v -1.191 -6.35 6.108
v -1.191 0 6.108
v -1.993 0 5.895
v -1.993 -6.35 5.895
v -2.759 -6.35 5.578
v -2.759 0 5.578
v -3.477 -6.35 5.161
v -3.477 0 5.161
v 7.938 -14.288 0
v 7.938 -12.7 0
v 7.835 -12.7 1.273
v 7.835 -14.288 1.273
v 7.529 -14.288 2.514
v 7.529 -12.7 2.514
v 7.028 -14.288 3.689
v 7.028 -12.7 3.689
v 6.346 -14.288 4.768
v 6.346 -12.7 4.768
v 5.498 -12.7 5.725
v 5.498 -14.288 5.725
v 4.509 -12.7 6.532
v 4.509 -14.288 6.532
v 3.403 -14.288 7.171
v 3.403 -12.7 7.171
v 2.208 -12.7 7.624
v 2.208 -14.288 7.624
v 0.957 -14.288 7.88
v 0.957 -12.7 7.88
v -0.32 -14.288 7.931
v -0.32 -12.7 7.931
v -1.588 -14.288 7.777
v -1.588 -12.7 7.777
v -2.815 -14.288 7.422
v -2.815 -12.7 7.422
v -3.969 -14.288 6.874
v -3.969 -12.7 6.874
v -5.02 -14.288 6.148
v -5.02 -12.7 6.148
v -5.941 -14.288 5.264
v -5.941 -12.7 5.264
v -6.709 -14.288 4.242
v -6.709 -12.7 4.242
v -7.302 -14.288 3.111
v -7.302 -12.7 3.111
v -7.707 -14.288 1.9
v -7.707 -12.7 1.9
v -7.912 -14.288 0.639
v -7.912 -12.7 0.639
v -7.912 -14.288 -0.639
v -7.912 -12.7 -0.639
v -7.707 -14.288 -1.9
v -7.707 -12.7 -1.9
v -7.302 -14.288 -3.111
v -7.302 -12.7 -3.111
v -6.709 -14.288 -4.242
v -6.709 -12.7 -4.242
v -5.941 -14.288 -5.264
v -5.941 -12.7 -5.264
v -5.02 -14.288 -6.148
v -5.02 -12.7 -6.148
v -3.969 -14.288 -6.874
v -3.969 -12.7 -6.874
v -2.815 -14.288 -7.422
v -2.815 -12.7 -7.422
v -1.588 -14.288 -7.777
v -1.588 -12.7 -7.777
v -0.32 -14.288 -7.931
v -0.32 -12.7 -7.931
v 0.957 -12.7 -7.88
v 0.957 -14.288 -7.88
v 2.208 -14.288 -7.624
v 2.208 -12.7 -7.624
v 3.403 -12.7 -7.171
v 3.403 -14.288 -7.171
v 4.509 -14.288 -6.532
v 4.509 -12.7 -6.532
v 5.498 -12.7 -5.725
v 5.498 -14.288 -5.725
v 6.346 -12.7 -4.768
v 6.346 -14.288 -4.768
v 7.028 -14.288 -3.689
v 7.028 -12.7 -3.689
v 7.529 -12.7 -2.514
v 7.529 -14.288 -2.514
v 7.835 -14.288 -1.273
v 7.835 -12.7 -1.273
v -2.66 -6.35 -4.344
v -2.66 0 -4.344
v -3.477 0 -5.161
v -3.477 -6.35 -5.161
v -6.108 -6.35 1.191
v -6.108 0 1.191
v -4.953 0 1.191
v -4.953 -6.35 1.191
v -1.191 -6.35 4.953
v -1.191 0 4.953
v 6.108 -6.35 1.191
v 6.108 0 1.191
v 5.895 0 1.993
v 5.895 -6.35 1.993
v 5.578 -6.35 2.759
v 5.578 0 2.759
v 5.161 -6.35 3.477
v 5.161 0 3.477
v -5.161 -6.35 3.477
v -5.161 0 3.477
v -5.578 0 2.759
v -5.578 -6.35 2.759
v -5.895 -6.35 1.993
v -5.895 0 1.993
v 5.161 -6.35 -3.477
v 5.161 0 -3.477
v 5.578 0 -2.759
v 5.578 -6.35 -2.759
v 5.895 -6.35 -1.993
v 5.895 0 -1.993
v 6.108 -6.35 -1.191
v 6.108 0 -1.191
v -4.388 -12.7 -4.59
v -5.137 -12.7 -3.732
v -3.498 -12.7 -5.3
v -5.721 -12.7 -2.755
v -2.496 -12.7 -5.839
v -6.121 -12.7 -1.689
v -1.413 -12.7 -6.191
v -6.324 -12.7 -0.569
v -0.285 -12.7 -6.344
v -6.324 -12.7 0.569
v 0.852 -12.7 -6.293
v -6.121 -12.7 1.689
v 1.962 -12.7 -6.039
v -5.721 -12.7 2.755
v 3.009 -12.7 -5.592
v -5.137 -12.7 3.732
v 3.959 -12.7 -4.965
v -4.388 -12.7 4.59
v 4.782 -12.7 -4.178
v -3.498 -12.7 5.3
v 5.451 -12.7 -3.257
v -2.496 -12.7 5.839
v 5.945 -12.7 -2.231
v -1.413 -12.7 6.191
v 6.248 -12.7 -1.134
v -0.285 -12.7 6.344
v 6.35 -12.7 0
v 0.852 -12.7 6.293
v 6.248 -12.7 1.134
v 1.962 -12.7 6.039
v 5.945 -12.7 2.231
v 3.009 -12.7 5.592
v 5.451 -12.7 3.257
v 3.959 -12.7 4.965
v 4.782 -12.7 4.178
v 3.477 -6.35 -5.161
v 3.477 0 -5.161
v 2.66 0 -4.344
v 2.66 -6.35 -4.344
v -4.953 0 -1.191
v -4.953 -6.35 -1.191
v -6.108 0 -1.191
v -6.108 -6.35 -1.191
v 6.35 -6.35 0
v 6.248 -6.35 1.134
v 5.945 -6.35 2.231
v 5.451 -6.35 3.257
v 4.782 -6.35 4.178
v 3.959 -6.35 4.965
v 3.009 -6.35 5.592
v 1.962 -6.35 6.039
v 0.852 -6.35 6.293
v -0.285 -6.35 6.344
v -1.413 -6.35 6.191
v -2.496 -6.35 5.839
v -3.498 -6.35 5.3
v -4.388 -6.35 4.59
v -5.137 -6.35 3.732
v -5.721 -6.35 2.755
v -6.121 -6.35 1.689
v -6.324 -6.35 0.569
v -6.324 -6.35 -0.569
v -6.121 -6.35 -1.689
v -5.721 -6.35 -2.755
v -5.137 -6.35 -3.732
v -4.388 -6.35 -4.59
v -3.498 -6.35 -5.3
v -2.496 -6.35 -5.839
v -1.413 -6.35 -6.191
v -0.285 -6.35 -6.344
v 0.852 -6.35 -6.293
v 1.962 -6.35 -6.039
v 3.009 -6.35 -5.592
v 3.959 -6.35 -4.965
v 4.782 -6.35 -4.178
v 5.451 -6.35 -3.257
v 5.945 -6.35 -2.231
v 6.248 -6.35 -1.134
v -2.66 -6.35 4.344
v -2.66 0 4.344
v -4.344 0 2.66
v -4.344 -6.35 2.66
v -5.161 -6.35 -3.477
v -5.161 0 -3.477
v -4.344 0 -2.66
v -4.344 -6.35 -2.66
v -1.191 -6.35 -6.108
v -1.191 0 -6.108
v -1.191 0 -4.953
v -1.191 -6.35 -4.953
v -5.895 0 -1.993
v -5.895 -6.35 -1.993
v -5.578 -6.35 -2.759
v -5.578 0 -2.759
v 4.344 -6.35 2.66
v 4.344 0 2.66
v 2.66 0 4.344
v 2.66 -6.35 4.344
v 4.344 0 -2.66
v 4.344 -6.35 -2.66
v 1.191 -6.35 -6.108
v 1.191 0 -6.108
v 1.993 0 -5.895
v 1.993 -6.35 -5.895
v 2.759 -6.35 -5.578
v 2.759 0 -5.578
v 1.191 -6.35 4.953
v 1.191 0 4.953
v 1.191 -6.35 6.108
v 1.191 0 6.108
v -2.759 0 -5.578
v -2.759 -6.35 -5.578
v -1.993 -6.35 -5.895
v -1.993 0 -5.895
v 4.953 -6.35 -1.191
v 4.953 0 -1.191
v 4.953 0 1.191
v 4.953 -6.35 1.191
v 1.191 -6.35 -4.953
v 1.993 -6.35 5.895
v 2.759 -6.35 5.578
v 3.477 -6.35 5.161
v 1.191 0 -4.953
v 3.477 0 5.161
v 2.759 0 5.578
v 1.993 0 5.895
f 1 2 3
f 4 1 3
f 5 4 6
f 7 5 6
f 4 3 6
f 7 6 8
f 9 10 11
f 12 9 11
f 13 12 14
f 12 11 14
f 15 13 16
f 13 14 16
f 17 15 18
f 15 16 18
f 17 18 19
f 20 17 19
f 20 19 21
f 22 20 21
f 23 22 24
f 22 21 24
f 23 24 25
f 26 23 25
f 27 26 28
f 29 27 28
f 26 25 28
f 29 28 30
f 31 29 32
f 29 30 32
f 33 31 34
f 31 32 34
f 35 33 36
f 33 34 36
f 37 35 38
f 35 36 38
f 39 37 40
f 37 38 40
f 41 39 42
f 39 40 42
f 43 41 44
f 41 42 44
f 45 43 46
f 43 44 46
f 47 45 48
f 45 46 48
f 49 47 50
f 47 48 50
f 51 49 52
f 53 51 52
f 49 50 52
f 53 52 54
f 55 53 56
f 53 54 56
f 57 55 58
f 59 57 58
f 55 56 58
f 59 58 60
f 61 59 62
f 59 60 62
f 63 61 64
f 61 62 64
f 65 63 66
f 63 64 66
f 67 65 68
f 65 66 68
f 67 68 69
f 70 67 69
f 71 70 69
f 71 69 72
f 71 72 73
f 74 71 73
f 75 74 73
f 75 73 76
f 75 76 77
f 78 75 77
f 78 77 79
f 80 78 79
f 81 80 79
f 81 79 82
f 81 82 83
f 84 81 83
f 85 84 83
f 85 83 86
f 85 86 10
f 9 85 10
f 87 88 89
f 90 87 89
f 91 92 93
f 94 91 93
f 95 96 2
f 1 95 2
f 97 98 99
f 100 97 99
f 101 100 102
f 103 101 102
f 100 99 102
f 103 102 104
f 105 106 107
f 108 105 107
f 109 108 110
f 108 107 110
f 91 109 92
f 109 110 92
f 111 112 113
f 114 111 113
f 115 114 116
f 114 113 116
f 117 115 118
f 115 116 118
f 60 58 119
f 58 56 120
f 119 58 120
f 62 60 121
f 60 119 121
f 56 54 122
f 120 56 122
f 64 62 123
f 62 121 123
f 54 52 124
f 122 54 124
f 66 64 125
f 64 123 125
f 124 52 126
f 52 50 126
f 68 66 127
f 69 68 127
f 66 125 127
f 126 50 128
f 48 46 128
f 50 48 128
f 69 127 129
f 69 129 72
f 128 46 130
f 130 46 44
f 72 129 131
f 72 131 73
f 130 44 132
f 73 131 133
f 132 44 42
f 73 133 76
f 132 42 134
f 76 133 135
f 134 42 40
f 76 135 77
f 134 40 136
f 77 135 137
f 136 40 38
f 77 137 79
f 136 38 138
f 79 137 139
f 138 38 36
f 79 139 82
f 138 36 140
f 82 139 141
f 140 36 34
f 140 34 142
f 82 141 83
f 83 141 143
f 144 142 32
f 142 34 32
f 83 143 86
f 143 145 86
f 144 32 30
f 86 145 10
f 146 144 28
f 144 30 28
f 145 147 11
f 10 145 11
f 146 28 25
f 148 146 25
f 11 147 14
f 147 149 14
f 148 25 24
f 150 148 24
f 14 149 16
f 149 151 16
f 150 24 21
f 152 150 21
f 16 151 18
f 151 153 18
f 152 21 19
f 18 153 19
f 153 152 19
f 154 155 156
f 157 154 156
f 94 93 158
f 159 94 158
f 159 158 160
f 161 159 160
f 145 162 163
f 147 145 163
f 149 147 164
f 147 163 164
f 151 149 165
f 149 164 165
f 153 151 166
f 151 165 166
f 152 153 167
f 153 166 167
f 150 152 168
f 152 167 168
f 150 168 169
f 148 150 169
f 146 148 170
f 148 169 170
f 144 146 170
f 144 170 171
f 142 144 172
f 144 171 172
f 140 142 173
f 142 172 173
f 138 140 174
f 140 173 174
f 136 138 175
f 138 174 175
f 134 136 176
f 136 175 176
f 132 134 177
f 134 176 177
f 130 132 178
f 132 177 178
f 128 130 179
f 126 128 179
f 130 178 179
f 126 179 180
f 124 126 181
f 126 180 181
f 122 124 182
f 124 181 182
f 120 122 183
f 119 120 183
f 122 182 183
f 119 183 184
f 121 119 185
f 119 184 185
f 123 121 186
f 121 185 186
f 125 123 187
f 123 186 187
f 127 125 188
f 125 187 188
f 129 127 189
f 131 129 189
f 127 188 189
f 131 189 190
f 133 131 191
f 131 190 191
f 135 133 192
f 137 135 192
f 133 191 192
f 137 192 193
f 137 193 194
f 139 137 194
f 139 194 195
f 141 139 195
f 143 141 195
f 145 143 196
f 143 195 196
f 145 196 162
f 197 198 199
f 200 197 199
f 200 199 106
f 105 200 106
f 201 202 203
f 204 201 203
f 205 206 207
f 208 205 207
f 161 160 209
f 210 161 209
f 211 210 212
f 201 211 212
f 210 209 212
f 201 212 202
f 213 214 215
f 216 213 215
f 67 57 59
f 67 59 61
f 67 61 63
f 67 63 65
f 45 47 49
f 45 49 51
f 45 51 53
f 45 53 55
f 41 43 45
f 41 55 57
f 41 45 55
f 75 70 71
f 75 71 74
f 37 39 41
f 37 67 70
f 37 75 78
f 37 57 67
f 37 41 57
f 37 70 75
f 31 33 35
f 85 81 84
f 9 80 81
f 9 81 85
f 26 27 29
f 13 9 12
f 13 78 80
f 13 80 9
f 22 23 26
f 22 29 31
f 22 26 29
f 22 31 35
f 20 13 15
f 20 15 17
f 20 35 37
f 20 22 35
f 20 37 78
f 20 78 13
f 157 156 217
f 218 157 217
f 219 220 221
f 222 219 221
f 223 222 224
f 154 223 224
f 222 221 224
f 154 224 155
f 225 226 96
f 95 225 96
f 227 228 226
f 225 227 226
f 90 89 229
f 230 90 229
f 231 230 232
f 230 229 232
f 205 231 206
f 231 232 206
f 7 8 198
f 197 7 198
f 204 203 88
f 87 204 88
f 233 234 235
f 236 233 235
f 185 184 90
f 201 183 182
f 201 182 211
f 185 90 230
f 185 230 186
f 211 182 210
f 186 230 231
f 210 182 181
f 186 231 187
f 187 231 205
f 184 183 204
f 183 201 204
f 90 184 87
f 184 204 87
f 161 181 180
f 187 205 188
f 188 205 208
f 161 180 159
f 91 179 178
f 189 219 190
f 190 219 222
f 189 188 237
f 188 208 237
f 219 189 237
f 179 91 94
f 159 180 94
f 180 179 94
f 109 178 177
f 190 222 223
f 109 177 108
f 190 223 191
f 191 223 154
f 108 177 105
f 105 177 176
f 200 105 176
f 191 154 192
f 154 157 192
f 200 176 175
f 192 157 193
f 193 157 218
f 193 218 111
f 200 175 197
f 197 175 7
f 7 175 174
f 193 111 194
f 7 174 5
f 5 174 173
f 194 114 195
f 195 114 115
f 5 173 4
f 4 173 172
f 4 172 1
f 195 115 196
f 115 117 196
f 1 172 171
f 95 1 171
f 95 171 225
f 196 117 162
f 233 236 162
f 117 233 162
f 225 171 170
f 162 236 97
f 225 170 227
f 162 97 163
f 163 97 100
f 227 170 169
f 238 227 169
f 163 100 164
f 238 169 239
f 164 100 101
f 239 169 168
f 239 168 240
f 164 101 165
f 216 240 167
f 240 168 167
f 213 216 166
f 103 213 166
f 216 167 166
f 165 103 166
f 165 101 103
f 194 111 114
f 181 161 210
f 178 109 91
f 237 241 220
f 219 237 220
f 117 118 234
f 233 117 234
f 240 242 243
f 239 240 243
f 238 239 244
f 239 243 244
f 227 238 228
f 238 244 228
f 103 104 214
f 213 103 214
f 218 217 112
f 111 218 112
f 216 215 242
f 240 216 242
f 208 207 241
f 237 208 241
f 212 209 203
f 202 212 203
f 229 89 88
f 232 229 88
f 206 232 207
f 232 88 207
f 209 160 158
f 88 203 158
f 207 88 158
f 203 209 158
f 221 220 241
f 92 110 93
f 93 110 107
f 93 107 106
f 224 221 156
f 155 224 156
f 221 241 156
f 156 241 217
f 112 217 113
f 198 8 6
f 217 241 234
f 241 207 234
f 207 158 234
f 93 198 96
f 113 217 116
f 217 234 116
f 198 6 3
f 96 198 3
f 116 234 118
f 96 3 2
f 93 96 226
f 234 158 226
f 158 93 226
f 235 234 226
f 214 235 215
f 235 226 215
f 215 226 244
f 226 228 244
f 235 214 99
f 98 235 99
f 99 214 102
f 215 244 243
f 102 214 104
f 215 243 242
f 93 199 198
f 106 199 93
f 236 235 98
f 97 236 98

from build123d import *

# Parameters (mm, degrees)
F1_DEPTH = 6.35
F2_R     = 6.35
F3_DEPTH = 6.35
F4_R     = 7.9375
F4_R_2   = 6.35
F5_DEPTH = 1.5875


with BuildPart() as f1:
    # F0 (on Front) → F1 (new body)
    with BuildSketch(Plane.XZ):
        with BuildLine():
            Line((-1.190625, 4.953), (-1.190625, 6.108039))
            ThreePointArc((-1.190625, 6.108039), (-2.381439, 5.749302), (-3.477137, 5.160935))
            Line((-3.477137, 5.160935), (-2.660401, 4.344199))
            Line((-2.660401, 4.344199), (-4.344199, 2.660401))
            Line((-4.344199, 2.660401), (-5.160935, 3.477137))
            ThreePointArc((-5.160935, 3.477137), (-5.749302, 2.381439), (-6.108039, 1.190625))
            Line((-6.108039, 1.190625), (-4.953, 1.190625))
            Line((-4.953, 1.190625), (-4.953, -1.190625))
            Line((-4.953, -1.190625), (-6.108039, -1.190625))
            ThreePointArc((-6.108039, -1.190625), (-5.749302, -2.381439), (-5.160935, -3.477137))
            Line((-5.160935, -3.477137), (-4.344199, -2.660401))
            Line((-4.344199, -2.660401), (-2.660401, -4.344199))
            Line((-2.660401, -4.344199), (-3.477137, -5.160935))
            ThreePointArc((-3.477137, -5.160935), (-2.381439, -5.749302), (-1.190625, -6.108039))
            Line((-1.190625, -6.108039), (-1.190625, -4.953))
            Line((-1.190625, -4.953), (1.190625, -4.953))
            Line((1.190625, -4.953), (1.190625, -6.108039))
            ThreePointArc((1.190625, -6.108039), (2.381439, -5.749302), (3.477137, -5.160935))
            Line((3.477137, -5.160935), (2.660401, -4.344199))
            Line((2.660401, -4.344199), (4.344199, -2.660401))
            Line((4.344199, -2.660401), (5.160935, -3.477137))
            ThreePointArc((5.160935, -3.477137), (5.749302, -2.381439), (6.108039, -1.190625))
            Line((6.108039, -1.190625), (4.953, -1.190625))
            Line((4.953, -1.190625), (4.953, 1.190625))
            Line((4.953, 1.190625), (6.108039, 1.190625))
            ThreePointArc((6.108039, 1.190625), (5.749302, 2.381439), (5.160935, 3.477137))
            Line((5.160935, 3.477137), (4.344199, 2.660401))
            Line((4.344199, 2.660401), (2.660401, 4.344199))
            Line((2.660401, 4.344199), (3.477137, 5.160935))
            ThreePointArc((3.477137, 5.160935), (2.381439, 5.749302), (1.190625, 6.108039))
            Line((1.190625, 6.108039), (1.190625, 4.953))
            Line((1.190625, 4.953), (-1.190625, 4.953))
        make_face()
    extrude(amount=F1_DEPTH)

    # F2 (on face) → F3 (join)
    with BuildSketch(Plane.XZ.offset(6.35)):
        Circle(F2_R)
        with BuildLine():
            Line((-3.477137, -5.160935), (-2.660401, -4.344199))
            Line((-2.660401, -4.344199), (-4.344199, -2.660401))
            Line((-4.344199, -2.660401), (-5.160935, -3.477137))
            ThreePointArc((-5.160935, -3.477137), (-5.749302, -2.381439), (-6.108039, -1.190625))
            Line((-6.108039, -1.190625), (-4.953, -1.190625))
            Line((-4.953, -1.190625), (-4.953, 1.190625))
            Line((-4.953, 1.190625), (-6.108039, 1.190625))
            ThreePointArc((-6.108039, 1.190625), (-5.749302, 2.381439), (-5.160935, 3.477137))
            Line((-5.160935, 3.477137), (-4.344199, 2.660401))
            Line((-4.344199, 2.660401), (-2.660401, 4.344199))
            Line((-2.660401, 4.344199), (-3.477137, 5.160935))
            ThreePointArc((-3.477137, 5.160935), (-2.381439, 5.749302), (-1.190625, 6.108039))
            Line((-1.190625, 6.108039), (-1.190625, 4.953))
            Line((-1.190625, 4.953), (1.190625, 4.953))
            Line((1.190625, 4.953), (1.190625, 6.108039))
            ThreePointArc((1.190625, 6.108039), (2.381439, 5.749302), (3.477137, 5.160935))
            Line((3.477137, 5.160935), (2.660401, 4.344199))
            Line((2.660401, 4.344199), (4.344199, 2.660401))
            Line((4.344199, 2.660401), (5.160935, 3.477137))
            ThreePointArc((5.160935, 3.477137), (5.749302, 2.381439), (6.108039, 1.190625))
            Line((6.108039, 1.190625), (4.953, 1.190625))
            Line((4.953, 1.190625), (4.953, -1.190625))
            Line((4.953, -1.190625), (6.108039, -1.190625))
            ThreePointArc((6.108039, -1.190625), (5.749302, -2.381439), (5.160935, -3.477137))
            Line((5.160935, -3.477137), (4.344199, -2.660401))
            Line((4.344199, -2.660401), (2.660401, -4.344199))
            Line((2.660401, -4.344199), (3.477137, -5.160935))
            ThreePointArc((3.477137, -5.160935), (2.381439, -5.749302), (1.190625, -6.108039))
            Line((1.190625, -6.108039), (1.190625, -4.953))
            Line((1.190625, -4.953), (-1.190625, -4.953))
            Line((-1.190625, -4.953), (-1.190625, -6.108039))
            ThreePointArc((-1.190625, -6.108039), (-2.381439, -5.749302), (-3.477137, -5.160935))
        make_face(mode=Mode.SUBTRACT)
        with BuildLine():
            Line((-4.344199, -2.660401), (-2.660401, -4.344199))
            Line((-2.660401, -4.344199), (-3.477137, -5.160935))
            ThreePointArc((-3.477137, -5.160935), (-2.381439, -5.749302), (-1.190625, -6.108039))
            Line((-1.190625, -6.108039), (-1.190625, -4.953))
            Line((-1.190625, -4.953), (1.190625, -4.953))
            Line((1.190625, -4.953), (1.190625, -6.108039))
            ThreePointArc((1.190625, -6.108039), (2.381439, -5.749302), (3.477137, -5.160935))
            Line((3.477137, -5.160935), (2.660401, -4.344199))
            Line((2.660401, -4.344199), (4.344199, -2.660401))
            Line((4.344199, -2.660401), (5.160935, -3.477137))
            ThreePointArc((5.160935, -3.477137), (5.749302, -2.381439), (6.108039, -1.190625))
            Line((6.108039, -1.190625), (4.953, -1.190625))
            Line((4.953, -1.190625), (4.953, 1.190625))
            Line((4.953, 1.190625), (6.108039, 1.190625))
            ThreePointArc((6.108039, 1.190625), (5.749302, 2.381439), (5.160935, 3.477137))
            Line((5.160935, 3.477137), (4.344199, 2.660401))
            Line((4.344199, 2.660401), (2.660401, 4.344199))
            Line((2.660401, 4.344199), (3.477137, 5.160935))
            ThreePointArc((3.477137, 5.160935), (2.381439, 5.749302), (1.190625, 6.108039))
            Line((1.190625, 6.108039), (1.190625, 4.953))
            Line((1.190625, 4.953), (-1.190625, 4.953))
            Line((-1.190625, 4.953), (-1.190625, 6.108039))
            ThreePointArc((-1.190625, 6.108039), (-2.381439, 5.749302), (-3.477137, 5.160935))
            Line((-3.477137, 5.160935), (-2.660401, 4.344199))
            Line((-2.660401, 4.344199), (-4.344199, 2.660401))
            Line((-4.344199, 2.660401), (-5.160935, 3.477137))
            ThreePointArc((-5.160935, 3.477137), (-5.749302, 2.381439), (-6.108039, 1.190625))
            Line((-6.108039, 1.190625), (-4.953, 1.190625))
            Line((-4.953, 1.190625), (-4.953, -1.190625))
            Line((-4.953, -1.190625), (-6.108039, -1.190625))
            ThreePointArc((-6.108039, -1.190625), (-5.749302, -2.381439), (-5.160935, -3.477137))
            Line((-5.160935, -3.477137), (-4.344199, -2.660401))
        make_face()
    extrude(amount=F3_DEPTH)

    # F4 (on face) → F5 (join)
    with BuildSketch(Plane.XZ.offset(12.7)):
        Circle(F4_R)
        Circle(F4_R_2, mode=Mode.SUBTRACT)
        Circle(F4_R_2)
    extrude(amount=F5_DEPTH)


solid = f1.part
